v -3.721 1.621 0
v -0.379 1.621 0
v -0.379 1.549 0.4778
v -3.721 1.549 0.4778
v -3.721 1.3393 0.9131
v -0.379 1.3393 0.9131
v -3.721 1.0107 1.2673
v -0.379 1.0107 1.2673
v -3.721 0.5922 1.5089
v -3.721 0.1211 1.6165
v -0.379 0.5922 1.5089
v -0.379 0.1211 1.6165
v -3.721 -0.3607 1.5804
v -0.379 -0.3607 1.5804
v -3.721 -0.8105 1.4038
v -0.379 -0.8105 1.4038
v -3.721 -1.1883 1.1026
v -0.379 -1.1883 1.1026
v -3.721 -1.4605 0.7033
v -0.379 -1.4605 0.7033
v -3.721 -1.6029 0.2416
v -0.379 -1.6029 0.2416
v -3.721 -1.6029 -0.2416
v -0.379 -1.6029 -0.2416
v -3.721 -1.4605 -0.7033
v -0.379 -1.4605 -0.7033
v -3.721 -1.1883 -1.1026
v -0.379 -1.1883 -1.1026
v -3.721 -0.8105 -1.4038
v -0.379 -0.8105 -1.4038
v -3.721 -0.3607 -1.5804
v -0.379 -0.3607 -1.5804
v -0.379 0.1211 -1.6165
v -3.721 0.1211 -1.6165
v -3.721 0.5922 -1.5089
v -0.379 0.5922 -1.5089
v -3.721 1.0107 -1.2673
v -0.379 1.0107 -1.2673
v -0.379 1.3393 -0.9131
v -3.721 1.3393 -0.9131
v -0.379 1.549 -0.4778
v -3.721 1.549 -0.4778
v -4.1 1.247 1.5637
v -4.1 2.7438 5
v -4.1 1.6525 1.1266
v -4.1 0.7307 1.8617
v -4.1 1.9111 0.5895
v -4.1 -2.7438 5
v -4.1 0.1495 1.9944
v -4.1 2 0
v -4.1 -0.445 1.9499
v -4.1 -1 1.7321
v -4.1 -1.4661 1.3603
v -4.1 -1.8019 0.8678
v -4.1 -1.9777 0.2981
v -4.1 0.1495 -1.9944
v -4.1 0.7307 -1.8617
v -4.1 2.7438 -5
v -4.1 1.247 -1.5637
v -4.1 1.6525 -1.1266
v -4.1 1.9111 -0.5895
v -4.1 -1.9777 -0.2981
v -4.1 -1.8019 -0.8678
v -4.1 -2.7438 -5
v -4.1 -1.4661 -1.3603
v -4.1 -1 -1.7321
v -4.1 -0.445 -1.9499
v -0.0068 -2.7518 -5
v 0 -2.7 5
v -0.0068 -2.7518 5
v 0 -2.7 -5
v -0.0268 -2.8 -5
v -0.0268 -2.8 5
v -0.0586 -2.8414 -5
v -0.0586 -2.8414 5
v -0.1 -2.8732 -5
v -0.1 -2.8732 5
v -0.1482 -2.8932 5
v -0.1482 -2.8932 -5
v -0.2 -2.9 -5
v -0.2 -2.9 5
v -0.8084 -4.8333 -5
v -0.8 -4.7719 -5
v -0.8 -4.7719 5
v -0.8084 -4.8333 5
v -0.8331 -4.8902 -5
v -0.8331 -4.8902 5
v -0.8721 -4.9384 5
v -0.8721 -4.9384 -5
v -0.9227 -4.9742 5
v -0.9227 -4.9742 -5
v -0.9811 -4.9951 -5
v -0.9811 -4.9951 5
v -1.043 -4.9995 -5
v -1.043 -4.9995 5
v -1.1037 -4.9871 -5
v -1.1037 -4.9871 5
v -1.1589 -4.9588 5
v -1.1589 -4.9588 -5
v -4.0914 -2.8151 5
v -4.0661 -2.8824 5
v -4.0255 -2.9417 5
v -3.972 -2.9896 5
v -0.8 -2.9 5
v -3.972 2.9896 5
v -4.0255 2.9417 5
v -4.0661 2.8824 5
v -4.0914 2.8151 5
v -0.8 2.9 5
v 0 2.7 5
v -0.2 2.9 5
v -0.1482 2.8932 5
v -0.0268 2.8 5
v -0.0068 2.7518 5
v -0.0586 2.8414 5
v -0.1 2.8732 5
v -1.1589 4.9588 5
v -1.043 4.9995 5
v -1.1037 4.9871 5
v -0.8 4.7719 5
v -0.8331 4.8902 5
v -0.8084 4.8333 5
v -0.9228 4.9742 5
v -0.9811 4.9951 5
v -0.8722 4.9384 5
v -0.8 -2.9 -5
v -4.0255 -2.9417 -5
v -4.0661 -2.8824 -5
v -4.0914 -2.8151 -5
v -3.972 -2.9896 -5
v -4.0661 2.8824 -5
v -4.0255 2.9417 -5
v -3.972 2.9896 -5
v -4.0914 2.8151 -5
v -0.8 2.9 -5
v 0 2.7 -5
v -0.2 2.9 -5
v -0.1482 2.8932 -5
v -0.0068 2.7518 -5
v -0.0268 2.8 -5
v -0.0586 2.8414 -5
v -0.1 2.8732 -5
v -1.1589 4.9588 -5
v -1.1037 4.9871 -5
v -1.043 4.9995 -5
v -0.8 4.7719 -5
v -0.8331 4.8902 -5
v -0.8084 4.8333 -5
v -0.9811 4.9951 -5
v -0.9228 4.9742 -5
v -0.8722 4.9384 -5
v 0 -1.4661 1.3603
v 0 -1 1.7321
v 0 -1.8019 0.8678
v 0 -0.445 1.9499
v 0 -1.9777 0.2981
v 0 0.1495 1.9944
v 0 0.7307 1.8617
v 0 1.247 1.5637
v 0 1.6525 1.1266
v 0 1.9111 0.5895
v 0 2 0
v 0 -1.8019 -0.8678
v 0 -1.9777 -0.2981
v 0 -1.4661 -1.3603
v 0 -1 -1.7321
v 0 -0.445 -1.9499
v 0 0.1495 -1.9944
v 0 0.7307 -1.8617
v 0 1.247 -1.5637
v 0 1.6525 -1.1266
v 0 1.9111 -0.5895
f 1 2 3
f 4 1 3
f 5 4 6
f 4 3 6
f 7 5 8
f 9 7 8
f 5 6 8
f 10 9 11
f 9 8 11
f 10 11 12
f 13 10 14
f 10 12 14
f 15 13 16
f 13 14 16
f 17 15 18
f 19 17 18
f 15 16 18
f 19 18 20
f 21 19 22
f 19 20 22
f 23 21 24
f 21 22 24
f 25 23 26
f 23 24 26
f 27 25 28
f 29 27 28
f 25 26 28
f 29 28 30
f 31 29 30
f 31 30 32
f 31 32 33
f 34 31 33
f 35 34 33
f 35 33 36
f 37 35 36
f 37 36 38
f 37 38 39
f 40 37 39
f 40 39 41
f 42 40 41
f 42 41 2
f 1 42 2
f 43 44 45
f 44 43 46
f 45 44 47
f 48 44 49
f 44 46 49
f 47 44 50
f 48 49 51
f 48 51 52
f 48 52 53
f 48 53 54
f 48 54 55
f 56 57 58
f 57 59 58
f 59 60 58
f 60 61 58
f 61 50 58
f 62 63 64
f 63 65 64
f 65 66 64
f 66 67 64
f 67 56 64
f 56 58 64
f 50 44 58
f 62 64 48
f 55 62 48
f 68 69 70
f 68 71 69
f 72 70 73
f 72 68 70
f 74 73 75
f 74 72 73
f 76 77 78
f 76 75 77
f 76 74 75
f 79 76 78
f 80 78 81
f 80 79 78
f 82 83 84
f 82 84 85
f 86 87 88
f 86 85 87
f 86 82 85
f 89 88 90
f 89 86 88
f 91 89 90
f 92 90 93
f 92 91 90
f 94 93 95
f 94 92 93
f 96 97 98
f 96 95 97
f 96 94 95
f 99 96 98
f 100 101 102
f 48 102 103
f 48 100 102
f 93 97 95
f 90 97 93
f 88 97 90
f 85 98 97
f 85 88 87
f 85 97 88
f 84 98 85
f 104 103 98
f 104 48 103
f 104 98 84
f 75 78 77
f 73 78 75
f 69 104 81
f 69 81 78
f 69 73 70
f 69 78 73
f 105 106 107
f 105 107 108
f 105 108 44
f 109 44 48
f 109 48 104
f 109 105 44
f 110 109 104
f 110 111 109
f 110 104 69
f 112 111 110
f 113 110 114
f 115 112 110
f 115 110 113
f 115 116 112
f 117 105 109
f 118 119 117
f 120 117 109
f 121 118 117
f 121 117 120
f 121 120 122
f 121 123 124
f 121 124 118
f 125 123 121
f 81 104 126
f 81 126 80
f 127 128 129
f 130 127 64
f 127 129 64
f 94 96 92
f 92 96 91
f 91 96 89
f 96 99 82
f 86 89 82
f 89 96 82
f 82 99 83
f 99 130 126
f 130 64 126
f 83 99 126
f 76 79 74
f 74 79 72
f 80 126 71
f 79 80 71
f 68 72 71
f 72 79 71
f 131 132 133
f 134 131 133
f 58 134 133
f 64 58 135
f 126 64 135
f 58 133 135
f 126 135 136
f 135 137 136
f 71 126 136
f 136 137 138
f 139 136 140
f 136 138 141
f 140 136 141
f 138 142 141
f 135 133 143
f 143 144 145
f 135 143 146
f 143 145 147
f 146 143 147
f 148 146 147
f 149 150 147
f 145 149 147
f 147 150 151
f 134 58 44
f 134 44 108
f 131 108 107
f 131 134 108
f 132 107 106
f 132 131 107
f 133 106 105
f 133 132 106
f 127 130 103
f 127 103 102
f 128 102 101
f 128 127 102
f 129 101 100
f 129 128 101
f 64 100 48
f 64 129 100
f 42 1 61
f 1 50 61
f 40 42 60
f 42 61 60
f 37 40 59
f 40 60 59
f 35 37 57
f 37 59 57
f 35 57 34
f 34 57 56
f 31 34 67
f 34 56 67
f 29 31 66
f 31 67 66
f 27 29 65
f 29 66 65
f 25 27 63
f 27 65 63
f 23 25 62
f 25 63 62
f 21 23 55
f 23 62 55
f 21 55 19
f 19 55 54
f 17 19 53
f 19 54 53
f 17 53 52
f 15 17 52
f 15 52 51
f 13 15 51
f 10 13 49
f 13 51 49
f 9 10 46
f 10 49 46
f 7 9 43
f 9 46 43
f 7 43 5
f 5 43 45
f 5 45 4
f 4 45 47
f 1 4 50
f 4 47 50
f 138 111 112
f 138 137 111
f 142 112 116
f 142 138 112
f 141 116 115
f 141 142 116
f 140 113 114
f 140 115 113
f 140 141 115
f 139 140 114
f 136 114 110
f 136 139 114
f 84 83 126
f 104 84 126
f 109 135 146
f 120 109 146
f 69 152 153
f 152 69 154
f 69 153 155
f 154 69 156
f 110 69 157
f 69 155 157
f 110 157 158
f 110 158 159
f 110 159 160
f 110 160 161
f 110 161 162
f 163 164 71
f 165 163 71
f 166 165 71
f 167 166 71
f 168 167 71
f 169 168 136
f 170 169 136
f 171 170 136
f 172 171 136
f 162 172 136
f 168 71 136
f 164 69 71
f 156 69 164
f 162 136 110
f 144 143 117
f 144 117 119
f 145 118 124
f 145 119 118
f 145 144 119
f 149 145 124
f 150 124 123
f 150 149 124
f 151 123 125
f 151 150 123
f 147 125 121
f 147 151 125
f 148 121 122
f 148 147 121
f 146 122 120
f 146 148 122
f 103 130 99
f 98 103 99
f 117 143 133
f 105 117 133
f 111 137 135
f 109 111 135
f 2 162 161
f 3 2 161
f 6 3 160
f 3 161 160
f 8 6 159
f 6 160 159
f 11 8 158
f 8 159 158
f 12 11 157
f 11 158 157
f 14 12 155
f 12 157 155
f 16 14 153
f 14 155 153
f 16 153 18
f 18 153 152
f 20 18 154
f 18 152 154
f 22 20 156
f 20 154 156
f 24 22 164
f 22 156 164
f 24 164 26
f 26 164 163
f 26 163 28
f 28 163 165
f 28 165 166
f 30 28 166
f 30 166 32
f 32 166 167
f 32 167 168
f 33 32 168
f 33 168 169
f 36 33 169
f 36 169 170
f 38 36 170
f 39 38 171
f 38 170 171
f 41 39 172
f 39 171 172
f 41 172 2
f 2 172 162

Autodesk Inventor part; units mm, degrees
sketch "Sketch_2" plane through (0, 0, 0) normal (0, 0, 1) x (1, 0, 0)
  arc A0 (-4.1, -2.7438) -> (-3.972, -2.9896) centre (-3.8, -2.7438) ccw
  line L0 (-3.972, -2.9896) -> (-1.1589, -4.9588)
  arc A1 (-1.1589, -4.9588) -> (-0.8, -4.7719) centre (-1.0281, -4.7719) ccw
  line L1 (-0.8, -4.7719) -> (-0.8, -2.9)
  line L2 (-0.8, -2.9) -> (-0.2, -2.9)
  arc A2 (-0.2, -2.9) -> (0, -2.7) centre (-0.2, -2.7) ccw
  line L3 (0, -2.7) -> (0, 2.7)
  arc A3 (0, 2.7) -> (-0.2, 2.9) centre (-0.2, 2.7) ccw
  line L4 (-0.2, 2.9) -> (-0.8, 2.9)
  line L5 (-0.8, 2.9) -> (-0.8, 4.7719)
  arc A4 (-0.8, 4.7719) -> (-1.1589, 4.9588) centre (-1.0281, 4.7719) ccw
  line L6 (-1.1589, 4.9588) -> (-3.972, 2.9896)
  arc A5 (-3.972, 2.9896) -> (-4.1, 2.7438) centre (-3.8, 2.7438) ccw
  line L7 (-4.1, 2.7438) -> (-4.1, -2.7438)
extrude "Extrusion1" add sketch "Sketch_2" along normal mid plane 10
sketch "Sketch_5" plane through (0, 0, 0) normal (0, 0, 1) x (1, 0, 0)
  line L0 (0, 0) -> (-4.1, 0)
  line L1 (-4.1, 0) -> (-4.1, 2)
  line L2 (-4.1, 2) -> (-3.721, 1.621)
  line L3 (-3.721, 1.621) -> (-0.379, 1.621)
  line L4 (-0.379, 1.621) -> (0, 2)
  line L5 (0, 2) -> (0, 0)
  line L6 (0, 0) -> (-4.1, 0)
revolve "Revolution1" cut sketch "Sketch_5" angle 360 about axis through (0, 0, 0) along (1, 0, 0)
thread "Thread1" size "M4x0.7" class "6H" standard "ISO Metric profile" full length
ref_plane "nut_XY" through (0, 0, 0) normal (1, 0, 0) x (0, 0, -1)
ref_plane "nut_YZ" through (0, 0, 0) normal (0, 0, -1) x (0, 1, 0)
ref_plane "nut_ZX" through (0, 0, 0) normal (0, 1, 0) x (1, 0, 0)
ref_plane "to_bolt_XY" through (-4.1, 0, 0) normal (1, 0, 0) x (0, 0, -1)
ref_plane "to_bolt_YZ" through (-4.1, 0, 0) normal (0, 0, -1) x (0, 1, 0)
ref_plane "to_bolt_ZX" through (-4.1, 0, 0) normal (0, 1, 0) x (1, 0, 0)
ref_plane "to_frames_XY" through (-0.8, 0, 0) normal (1, 0, 0) x (0, 0, -1)
ref_plane "to_frames_YZ" through (-0.8, 0, 0) normal (0, 0, -1) x (0, 1, 0)
ref_plane "to_frames_ZX" through (-0.8, 0, 0) normal (0, 1, 0) x (1, 0, 0)
ref_plane "to_lane_XY" through (0, 0, 0) normal (0, 0, 1) x (1, 0, 0)
ref_plane "to_lane_YZ" through (0, 0, 0) normal (1, 0, 0) x (0, 1, 0)
ref_plane "to_lane_ZX" through (0, 0, 0) normal (0, 1, 0) x (0, 0, 1)
properties part number "HNTT5-4" material "알루미늄 6061"
